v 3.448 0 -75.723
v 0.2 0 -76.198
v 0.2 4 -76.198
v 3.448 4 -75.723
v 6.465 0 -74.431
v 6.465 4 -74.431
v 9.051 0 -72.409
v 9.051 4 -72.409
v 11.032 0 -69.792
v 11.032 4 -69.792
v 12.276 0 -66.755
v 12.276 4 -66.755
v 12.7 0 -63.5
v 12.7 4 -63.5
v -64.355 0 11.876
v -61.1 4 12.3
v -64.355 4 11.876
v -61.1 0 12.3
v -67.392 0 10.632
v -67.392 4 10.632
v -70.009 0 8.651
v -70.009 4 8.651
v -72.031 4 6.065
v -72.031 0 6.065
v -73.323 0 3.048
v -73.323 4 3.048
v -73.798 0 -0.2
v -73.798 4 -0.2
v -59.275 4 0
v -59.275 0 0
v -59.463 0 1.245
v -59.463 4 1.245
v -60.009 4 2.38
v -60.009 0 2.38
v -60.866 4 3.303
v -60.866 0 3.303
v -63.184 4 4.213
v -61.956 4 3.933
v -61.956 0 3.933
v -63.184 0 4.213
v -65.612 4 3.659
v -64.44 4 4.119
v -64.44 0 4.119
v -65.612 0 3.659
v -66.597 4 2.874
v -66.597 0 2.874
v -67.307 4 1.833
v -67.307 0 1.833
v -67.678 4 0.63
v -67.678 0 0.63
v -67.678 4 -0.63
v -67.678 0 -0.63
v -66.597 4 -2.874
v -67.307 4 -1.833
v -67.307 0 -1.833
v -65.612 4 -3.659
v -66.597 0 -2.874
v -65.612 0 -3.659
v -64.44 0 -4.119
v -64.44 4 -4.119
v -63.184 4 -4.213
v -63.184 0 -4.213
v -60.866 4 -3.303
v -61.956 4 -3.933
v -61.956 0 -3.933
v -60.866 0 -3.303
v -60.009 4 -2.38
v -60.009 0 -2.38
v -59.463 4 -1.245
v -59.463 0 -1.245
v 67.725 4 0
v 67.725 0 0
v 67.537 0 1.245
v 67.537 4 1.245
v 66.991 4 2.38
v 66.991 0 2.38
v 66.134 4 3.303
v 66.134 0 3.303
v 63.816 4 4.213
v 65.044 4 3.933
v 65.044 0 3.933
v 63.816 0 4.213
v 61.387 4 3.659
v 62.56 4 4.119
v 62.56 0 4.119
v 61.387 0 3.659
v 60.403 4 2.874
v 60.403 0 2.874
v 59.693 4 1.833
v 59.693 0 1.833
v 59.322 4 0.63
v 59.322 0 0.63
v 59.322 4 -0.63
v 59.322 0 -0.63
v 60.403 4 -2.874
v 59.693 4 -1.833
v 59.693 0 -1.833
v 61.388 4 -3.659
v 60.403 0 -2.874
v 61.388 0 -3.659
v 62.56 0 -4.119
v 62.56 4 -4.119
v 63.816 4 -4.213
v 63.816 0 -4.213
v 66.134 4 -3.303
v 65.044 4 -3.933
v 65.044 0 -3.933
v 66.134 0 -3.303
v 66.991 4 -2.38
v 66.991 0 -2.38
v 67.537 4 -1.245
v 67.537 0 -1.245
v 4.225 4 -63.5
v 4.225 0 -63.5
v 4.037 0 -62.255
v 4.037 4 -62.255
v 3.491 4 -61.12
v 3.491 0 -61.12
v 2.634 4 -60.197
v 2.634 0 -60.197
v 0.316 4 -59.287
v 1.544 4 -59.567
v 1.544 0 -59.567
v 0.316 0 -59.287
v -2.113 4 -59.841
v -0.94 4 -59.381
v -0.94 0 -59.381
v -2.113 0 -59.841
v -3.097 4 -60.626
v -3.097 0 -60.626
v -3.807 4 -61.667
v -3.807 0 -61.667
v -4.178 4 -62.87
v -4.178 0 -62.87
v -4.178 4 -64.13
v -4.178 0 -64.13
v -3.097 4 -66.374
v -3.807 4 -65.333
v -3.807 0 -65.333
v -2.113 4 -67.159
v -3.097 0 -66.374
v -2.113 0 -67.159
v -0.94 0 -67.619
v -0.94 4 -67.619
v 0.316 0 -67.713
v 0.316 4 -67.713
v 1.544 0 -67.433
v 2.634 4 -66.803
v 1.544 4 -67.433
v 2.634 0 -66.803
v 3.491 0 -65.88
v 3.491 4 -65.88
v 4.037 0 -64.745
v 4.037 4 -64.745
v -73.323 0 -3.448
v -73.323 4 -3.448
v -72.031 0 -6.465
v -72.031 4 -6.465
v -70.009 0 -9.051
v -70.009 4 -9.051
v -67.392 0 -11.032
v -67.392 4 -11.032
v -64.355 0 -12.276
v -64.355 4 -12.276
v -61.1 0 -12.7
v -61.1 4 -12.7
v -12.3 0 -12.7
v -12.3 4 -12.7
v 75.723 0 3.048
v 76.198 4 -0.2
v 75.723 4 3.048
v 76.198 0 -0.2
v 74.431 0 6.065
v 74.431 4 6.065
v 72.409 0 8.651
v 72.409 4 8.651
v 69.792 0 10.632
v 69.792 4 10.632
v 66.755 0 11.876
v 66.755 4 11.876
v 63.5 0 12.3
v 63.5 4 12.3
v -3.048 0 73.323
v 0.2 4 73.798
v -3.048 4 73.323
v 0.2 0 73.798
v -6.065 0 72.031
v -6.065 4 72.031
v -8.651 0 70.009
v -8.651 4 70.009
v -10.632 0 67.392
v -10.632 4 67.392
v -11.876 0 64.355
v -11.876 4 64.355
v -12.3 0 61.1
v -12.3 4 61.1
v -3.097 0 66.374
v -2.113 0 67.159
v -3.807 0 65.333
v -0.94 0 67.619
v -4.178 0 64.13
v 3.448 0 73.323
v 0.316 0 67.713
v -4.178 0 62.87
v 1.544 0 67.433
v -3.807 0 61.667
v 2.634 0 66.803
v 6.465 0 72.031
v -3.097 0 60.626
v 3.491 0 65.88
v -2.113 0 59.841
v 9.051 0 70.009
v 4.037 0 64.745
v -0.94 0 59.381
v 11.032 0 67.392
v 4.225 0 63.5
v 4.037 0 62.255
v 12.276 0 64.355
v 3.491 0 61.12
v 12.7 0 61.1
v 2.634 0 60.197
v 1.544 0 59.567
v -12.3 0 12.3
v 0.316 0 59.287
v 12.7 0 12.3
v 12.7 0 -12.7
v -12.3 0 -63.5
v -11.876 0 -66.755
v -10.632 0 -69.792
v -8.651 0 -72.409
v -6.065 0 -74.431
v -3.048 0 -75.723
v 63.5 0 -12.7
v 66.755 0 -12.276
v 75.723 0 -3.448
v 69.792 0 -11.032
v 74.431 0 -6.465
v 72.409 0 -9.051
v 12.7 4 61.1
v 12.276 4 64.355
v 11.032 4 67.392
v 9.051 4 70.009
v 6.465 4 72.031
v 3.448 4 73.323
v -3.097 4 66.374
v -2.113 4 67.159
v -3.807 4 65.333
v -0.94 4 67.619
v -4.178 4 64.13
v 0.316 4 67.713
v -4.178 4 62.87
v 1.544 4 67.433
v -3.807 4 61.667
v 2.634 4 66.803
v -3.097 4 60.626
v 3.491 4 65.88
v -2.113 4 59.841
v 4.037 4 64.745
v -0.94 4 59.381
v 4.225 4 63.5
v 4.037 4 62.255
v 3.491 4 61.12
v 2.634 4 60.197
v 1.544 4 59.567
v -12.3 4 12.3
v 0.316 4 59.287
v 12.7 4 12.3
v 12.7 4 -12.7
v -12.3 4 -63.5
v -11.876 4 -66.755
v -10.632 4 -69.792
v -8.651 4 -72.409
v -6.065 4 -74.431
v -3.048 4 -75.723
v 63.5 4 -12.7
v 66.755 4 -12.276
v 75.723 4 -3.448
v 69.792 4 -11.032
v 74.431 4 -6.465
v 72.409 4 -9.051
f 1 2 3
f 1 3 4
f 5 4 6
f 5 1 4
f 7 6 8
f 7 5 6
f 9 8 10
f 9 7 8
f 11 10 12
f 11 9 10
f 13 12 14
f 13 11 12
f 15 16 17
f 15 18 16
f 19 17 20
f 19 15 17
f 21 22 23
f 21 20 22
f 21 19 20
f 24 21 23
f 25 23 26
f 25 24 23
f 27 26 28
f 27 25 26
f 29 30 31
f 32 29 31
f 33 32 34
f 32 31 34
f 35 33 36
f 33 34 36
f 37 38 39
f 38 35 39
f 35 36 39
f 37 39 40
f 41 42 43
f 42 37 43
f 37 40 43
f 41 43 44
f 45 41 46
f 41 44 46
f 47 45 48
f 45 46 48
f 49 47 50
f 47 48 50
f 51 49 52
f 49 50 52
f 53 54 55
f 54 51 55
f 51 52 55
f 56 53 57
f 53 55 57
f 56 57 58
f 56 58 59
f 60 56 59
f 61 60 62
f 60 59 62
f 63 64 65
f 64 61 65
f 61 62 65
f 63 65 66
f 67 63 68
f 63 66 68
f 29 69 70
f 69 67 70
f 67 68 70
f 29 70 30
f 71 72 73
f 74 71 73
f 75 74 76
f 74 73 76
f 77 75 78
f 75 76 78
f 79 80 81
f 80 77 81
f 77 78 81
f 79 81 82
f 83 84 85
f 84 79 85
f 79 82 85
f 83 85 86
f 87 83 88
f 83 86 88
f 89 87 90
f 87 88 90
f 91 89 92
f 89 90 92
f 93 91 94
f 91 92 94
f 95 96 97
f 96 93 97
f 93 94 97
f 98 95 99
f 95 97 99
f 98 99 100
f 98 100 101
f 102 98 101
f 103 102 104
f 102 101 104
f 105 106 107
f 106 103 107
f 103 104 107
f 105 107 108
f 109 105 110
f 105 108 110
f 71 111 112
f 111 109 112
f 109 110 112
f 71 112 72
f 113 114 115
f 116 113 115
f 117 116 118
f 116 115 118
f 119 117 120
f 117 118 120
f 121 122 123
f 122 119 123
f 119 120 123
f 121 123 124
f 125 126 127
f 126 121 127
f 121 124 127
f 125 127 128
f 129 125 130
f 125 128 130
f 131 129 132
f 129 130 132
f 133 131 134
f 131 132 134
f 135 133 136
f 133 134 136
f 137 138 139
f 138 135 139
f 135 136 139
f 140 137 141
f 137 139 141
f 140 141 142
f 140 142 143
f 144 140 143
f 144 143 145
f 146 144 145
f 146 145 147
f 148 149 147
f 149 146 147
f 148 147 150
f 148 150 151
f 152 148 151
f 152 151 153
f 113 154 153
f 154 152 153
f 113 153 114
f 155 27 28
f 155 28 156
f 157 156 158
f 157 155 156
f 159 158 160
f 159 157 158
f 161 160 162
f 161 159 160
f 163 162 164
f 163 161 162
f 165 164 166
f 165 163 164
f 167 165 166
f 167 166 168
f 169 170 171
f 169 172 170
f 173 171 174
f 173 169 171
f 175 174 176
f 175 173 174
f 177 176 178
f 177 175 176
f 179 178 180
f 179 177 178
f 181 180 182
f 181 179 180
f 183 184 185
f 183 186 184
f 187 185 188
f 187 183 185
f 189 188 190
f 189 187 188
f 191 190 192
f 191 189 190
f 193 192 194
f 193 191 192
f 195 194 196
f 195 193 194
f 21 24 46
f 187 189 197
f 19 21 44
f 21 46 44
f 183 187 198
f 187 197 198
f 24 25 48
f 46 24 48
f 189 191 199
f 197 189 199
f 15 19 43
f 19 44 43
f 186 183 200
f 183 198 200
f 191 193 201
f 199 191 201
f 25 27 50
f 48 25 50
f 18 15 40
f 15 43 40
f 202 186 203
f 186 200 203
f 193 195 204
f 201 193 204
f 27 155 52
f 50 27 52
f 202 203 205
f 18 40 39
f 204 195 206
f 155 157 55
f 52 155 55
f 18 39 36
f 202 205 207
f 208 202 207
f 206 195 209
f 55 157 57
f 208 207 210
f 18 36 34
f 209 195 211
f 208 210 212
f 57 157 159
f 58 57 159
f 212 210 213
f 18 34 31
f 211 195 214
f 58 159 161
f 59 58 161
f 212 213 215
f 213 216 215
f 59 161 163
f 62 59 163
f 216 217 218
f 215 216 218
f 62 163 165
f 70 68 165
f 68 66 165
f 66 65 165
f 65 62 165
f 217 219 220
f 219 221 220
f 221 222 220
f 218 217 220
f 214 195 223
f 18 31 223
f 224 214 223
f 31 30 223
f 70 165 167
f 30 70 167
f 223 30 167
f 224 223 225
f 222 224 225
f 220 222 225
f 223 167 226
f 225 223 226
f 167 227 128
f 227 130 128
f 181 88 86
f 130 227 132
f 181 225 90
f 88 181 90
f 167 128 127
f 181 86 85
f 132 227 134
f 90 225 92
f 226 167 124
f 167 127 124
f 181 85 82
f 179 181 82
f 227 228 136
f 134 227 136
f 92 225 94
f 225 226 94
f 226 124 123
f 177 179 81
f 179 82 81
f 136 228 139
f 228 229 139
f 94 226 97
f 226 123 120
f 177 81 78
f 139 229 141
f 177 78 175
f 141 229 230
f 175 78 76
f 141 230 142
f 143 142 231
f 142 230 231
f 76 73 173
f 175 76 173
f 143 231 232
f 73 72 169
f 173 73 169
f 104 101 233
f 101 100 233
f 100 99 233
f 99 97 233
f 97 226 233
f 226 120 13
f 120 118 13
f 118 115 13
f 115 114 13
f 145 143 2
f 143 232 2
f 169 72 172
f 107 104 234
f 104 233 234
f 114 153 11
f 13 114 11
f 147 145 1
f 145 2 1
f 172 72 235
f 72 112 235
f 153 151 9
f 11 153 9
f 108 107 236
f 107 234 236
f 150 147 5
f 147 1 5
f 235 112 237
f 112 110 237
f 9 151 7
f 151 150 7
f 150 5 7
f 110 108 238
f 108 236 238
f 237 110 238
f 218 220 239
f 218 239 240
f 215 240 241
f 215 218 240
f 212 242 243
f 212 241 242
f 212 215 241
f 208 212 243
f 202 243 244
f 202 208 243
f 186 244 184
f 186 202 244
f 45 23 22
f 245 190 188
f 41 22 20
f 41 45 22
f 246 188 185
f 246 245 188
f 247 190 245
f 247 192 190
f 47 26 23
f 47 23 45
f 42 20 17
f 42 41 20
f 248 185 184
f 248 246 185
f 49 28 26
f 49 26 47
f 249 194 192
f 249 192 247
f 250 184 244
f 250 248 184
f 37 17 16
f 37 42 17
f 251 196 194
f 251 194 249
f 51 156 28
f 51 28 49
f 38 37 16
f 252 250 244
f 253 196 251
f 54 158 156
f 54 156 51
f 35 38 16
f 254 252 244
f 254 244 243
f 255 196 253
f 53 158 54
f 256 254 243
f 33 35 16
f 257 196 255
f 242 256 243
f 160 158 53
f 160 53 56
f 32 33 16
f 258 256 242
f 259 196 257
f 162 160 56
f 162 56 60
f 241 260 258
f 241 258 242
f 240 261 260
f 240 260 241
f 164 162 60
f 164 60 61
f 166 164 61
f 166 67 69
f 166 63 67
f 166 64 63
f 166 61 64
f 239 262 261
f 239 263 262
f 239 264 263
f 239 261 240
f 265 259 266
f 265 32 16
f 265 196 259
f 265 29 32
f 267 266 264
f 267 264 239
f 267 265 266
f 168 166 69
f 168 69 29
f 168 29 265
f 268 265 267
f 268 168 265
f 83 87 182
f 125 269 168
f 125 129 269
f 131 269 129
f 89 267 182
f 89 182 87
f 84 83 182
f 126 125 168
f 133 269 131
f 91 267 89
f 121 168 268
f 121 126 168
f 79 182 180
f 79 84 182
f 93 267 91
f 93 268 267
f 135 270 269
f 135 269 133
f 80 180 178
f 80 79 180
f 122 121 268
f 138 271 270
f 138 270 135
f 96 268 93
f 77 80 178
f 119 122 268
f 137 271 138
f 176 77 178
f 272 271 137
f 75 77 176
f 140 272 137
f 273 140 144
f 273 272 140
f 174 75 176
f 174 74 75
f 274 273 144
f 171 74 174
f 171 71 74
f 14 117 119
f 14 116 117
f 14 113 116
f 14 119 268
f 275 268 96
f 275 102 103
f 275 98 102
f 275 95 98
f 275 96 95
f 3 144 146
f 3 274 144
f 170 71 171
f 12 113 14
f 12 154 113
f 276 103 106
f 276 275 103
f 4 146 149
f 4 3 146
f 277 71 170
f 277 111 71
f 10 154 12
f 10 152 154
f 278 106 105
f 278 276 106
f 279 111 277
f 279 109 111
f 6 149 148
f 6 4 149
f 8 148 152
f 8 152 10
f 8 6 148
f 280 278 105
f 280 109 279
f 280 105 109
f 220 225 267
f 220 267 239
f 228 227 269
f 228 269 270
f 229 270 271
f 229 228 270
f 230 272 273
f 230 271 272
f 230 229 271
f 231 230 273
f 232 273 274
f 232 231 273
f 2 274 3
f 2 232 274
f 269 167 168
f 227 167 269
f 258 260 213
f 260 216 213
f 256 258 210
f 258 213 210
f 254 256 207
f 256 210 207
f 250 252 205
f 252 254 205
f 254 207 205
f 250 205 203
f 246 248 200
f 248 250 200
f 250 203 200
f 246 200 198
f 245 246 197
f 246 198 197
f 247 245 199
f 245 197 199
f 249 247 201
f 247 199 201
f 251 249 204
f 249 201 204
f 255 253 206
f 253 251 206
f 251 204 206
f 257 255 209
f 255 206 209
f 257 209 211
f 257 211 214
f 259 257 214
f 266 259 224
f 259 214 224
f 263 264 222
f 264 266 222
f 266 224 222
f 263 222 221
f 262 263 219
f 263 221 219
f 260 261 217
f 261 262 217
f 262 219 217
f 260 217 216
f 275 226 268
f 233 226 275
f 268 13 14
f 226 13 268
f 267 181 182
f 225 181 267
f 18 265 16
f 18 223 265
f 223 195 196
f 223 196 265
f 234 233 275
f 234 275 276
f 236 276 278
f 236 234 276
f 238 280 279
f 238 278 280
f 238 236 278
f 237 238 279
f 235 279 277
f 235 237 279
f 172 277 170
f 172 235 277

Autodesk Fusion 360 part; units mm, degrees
sketch "Sketch1" plane through (0, 0, 0) normal (0, 1, 0) x (1, 0, 0)
  line L0 (0.4, 76.2) -> (0, 76.2)
  line L1 (12.7, 63.5) -> (12.7, -61.1)
  line L2 (0, -73.8) -> (0.4, -73.8)
  line L3 (-12.3, -61.1) -> (-12.3, 63.5)
  line L4 (-61.1, 12.7) -> (63.5, 12.7)
  line L5 (76.2, 0) -> (76.2, 0.4)
  line L6 (63.5, -12.3) -> (-61.1, -12.3)
  line L7 (-73.8, 0.4) -> (-73.8, 0)
  circle A0 centre (-63.5, 0) radius 4.225
  circle A1 centre (0, 63.5) radius 4.225
  circle A2 centre (63.5, 0) radius 4.225
  circle A3 centre (0, -63.5) radius 4.225
  arc A4 (-73.8, 0.4) -> (-61.1, -12.3) centre (-61.1, 0.4) ccw
  arc A5 (-61.1, 12.7) -> (-73.8, 0) centre (-61.1, 0) ccw
  arc A6 (0.4, 76.2) -> (-12.3, 63.5) centre (0.4, 63.5) ccw
  arc A7 (12.7, 63.5) -> (0, 76.2) centre (0, 63.5) ccw
  arc A8 (76.2, 0) -> (63.5, 12.7) centre (63.5, 0) ccw
  arc A9 (63.5, -12.3) -> (76.2, 0.4) centre (63.5, 0.4) ccw
  arc A10 (-12.3, -61.1) -> (0.4, -73.8) centre (0.4, -61.1) ccw
  arc A11 (0, -73.8) -> (12.7, -61.1) centre (0, -61.1) ccw
  point P0 (-12.3, 76.2)
  point P1 (12.7, 76.2)
  point P2 (-12.3, -73.8)
  point P3 (-73.8, 12.7)
  point P4 (76.2, 12.7)
  point P5 (-73.8, -12.3)
  dimension "d3" = 25
  dimension "d4" = 150
  dimension "d5" = 150
  dimension "d6" = 25
  dimension "d7" = 8.45
  dimension "d8" = 8.45
  dimension "d9" = 8.45
  dimension "d10" = 8.45
  dimension "d11" = 12.7
extrude "Extrude1" add sketch "Sketch1" along normal blind 4
